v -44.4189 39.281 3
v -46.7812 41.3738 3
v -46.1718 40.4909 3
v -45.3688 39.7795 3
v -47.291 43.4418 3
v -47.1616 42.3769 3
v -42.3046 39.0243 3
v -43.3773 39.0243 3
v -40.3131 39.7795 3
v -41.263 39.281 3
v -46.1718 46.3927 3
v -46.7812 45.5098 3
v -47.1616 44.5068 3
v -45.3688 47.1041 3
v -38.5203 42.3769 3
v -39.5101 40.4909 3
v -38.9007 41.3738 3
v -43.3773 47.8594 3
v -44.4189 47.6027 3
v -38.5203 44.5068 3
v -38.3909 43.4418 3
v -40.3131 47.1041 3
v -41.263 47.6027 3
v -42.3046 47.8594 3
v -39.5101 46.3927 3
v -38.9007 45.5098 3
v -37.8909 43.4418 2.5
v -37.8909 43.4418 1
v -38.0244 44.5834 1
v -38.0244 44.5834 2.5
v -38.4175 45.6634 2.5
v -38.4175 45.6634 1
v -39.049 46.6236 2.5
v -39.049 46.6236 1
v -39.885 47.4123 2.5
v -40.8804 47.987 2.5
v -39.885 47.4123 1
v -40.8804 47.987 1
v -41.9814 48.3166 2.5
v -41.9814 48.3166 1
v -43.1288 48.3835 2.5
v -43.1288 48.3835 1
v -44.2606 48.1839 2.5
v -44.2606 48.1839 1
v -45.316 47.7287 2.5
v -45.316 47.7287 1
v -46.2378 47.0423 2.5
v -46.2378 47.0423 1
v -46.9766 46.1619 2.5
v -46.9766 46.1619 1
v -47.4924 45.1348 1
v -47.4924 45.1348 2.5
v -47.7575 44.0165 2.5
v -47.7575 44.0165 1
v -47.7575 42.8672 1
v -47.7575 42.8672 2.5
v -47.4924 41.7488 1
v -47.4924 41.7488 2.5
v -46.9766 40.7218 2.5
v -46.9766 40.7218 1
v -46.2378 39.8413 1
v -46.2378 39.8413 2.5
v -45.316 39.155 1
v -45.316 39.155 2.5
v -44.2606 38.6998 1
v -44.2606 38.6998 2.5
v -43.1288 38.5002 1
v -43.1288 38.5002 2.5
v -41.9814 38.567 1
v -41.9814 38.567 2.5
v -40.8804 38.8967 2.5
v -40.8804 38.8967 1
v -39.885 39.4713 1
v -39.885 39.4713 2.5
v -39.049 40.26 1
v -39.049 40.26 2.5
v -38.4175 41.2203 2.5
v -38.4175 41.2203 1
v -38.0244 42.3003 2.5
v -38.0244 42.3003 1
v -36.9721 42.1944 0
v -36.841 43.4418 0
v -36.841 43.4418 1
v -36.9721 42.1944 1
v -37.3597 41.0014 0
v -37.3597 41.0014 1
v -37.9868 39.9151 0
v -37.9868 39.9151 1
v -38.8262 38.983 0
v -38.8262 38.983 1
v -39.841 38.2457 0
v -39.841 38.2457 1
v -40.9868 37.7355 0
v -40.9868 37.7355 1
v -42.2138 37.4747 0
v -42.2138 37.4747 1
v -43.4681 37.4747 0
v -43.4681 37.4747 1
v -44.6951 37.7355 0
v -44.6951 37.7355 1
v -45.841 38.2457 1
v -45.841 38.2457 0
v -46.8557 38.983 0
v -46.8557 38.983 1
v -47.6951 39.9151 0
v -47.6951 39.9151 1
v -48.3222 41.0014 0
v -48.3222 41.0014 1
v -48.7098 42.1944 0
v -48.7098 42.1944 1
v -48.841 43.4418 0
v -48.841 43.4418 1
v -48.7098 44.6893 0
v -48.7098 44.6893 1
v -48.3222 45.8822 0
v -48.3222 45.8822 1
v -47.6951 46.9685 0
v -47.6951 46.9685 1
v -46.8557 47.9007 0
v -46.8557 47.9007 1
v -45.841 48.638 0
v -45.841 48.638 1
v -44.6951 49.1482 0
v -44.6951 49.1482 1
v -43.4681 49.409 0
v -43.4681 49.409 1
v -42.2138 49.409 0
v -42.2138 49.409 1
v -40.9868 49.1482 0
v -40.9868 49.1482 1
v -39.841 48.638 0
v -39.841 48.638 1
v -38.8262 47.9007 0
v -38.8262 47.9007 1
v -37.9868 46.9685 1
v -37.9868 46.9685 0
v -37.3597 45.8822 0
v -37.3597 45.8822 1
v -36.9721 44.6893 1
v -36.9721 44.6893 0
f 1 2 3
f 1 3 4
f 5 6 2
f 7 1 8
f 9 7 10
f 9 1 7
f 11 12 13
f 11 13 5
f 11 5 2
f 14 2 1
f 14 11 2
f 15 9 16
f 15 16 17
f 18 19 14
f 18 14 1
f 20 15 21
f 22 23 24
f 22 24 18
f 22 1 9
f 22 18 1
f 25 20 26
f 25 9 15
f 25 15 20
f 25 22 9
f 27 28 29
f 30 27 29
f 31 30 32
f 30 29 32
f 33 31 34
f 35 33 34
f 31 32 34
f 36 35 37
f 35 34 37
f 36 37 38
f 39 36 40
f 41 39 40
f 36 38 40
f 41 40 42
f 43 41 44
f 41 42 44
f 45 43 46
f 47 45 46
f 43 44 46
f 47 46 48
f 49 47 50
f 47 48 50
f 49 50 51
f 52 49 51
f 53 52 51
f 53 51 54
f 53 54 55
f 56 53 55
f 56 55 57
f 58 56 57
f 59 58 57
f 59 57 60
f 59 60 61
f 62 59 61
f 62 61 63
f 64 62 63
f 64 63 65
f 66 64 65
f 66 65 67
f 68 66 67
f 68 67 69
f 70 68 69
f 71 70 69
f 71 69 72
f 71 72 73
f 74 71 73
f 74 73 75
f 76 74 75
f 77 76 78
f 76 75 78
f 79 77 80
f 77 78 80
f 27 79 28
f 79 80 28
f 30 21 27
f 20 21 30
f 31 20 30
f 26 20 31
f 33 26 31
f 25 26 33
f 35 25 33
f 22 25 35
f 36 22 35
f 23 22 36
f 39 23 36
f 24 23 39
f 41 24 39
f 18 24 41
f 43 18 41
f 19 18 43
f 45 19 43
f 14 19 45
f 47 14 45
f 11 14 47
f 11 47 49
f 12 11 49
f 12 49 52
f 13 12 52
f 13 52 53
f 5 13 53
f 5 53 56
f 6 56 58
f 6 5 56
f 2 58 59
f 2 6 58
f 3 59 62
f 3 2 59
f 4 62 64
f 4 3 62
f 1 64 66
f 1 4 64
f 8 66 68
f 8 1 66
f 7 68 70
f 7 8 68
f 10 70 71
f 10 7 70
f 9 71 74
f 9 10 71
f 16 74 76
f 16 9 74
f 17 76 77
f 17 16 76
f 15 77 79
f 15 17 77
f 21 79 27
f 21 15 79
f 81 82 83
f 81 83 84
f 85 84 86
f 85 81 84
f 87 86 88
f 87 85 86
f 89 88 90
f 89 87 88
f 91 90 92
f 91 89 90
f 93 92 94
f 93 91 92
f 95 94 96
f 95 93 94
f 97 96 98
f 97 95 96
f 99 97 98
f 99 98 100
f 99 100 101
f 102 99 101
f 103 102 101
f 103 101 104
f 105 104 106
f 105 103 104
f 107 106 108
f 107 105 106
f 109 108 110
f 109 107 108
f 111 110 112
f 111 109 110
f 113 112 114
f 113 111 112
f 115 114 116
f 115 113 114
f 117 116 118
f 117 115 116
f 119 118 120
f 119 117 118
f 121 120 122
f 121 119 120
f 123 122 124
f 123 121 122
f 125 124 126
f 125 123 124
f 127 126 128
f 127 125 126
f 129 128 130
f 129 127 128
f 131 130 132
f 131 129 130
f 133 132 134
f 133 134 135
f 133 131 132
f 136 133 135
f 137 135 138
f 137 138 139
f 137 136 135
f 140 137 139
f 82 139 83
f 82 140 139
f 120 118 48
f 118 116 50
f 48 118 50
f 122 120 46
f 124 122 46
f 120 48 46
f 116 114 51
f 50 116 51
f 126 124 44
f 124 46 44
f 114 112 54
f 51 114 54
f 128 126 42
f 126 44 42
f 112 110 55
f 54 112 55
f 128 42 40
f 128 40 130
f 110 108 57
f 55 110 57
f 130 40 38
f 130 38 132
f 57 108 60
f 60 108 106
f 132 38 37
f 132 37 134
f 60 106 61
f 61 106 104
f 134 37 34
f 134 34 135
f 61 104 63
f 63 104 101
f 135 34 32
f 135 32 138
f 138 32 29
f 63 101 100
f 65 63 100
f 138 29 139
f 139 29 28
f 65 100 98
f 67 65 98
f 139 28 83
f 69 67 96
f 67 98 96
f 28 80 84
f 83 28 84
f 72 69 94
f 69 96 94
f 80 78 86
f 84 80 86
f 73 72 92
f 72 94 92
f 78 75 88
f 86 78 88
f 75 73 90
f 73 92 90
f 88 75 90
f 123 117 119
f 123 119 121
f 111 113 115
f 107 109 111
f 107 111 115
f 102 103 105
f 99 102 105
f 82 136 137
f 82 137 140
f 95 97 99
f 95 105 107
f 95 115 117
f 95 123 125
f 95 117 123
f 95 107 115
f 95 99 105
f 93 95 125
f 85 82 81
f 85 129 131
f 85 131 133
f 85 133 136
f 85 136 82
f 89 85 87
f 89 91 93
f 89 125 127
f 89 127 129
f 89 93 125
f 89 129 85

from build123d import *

# Parameters (mm, degrees)
F0_R     = 4.95
F1_DEPTH = 3
F2_R     = 6
F2_R_2   = 4.95
F3_DEPTH = 1
F4_SIZE  = 0.5


with BuildPart() as f1:
    # F0 (on Top) → F1 (new body)
    with BuildSketch(Plane.XY):
        with Locations((-42.84095, 43.441828)):
            Circle(F0_R)
    extrude(amount=F1_DEPTH)

    # F2 (on face) → F3 (join)
    with BuildSketch(Plane(origin=(0, 0, 0), x_dir=(1, 0, 0), z_dir=(0, 0, -1))):
        with Locations((-42.84095, -43.441828)):
            Circle(F2_R)
        with Locations((-42.84095, -43.441828)):
            Circle(F2_R_2, mode=Mode.SUBTRACT)
    extrude(amount=-F3_DEPTH)

    # F4
    f4_edges = [f1.edges().sort_by_distance(p)[0] for p in [
        (-47.79095, 43.441828, 3),
    ]]
    chamfer(f4_edges, length=F4_SIZE)


solid = f1.part
